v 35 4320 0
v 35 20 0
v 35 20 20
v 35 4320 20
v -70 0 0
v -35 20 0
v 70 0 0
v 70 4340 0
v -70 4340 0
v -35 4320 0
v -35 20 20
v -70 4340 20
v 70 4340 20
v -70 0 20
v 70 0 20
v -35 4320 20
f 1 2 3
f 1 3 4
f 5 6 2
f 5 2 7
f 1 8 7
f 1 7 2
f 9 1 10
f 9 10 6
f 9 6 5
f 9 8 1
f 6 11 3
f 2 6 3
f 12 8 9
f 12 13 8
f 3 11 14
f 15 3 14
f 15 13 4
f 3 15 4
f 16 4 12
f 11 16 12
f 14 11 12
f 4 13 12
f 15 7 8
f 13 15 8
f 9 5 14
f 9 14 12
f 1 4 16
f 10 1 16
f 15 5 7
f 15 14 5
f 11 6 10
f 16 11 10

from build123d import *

# Parameters (mm, degrees)
F0_W     = 35
F0_H     = 4340
F1_DEPTH = 20
F2_W     = 70
F2_H     = 20
F4_DEPTH = 20
F3_W     = 70
F3_H     = 20
F5_DEPTH = 20


with BuildPart() as f1:
    # F0 (on Top) → F1 (new body)
    with BuildSketch(Plane.XY):
        with Locations((-52.5, 2170)):
            Rectangle(F0_W, F0_H)
        with Locations((52.5, 2170)):
            Rectangle(F0_W, F0_H)
    extrude(amount=F1_DEPTH)

    # F2 (on face) → F4 (join)
    with BuildSketch(Plane.XZ):
        with Locations((0, 10)):
            Rectangle(F2_W, F2_H)
    extrude(amount=-F4_DEPTH)

    # F3 (on face) → F5 (join)
    with BuildSketch(Plane(origin=(0, 4340, 0), x_dir=(-1, 0, 0), z_dir=(0, 1, 0))):
        with Locations((0, 10)):
            Rectangle(F3_W, F3_H)
    extrude(amount=-F5_DEPTH)


solid = f1.part
